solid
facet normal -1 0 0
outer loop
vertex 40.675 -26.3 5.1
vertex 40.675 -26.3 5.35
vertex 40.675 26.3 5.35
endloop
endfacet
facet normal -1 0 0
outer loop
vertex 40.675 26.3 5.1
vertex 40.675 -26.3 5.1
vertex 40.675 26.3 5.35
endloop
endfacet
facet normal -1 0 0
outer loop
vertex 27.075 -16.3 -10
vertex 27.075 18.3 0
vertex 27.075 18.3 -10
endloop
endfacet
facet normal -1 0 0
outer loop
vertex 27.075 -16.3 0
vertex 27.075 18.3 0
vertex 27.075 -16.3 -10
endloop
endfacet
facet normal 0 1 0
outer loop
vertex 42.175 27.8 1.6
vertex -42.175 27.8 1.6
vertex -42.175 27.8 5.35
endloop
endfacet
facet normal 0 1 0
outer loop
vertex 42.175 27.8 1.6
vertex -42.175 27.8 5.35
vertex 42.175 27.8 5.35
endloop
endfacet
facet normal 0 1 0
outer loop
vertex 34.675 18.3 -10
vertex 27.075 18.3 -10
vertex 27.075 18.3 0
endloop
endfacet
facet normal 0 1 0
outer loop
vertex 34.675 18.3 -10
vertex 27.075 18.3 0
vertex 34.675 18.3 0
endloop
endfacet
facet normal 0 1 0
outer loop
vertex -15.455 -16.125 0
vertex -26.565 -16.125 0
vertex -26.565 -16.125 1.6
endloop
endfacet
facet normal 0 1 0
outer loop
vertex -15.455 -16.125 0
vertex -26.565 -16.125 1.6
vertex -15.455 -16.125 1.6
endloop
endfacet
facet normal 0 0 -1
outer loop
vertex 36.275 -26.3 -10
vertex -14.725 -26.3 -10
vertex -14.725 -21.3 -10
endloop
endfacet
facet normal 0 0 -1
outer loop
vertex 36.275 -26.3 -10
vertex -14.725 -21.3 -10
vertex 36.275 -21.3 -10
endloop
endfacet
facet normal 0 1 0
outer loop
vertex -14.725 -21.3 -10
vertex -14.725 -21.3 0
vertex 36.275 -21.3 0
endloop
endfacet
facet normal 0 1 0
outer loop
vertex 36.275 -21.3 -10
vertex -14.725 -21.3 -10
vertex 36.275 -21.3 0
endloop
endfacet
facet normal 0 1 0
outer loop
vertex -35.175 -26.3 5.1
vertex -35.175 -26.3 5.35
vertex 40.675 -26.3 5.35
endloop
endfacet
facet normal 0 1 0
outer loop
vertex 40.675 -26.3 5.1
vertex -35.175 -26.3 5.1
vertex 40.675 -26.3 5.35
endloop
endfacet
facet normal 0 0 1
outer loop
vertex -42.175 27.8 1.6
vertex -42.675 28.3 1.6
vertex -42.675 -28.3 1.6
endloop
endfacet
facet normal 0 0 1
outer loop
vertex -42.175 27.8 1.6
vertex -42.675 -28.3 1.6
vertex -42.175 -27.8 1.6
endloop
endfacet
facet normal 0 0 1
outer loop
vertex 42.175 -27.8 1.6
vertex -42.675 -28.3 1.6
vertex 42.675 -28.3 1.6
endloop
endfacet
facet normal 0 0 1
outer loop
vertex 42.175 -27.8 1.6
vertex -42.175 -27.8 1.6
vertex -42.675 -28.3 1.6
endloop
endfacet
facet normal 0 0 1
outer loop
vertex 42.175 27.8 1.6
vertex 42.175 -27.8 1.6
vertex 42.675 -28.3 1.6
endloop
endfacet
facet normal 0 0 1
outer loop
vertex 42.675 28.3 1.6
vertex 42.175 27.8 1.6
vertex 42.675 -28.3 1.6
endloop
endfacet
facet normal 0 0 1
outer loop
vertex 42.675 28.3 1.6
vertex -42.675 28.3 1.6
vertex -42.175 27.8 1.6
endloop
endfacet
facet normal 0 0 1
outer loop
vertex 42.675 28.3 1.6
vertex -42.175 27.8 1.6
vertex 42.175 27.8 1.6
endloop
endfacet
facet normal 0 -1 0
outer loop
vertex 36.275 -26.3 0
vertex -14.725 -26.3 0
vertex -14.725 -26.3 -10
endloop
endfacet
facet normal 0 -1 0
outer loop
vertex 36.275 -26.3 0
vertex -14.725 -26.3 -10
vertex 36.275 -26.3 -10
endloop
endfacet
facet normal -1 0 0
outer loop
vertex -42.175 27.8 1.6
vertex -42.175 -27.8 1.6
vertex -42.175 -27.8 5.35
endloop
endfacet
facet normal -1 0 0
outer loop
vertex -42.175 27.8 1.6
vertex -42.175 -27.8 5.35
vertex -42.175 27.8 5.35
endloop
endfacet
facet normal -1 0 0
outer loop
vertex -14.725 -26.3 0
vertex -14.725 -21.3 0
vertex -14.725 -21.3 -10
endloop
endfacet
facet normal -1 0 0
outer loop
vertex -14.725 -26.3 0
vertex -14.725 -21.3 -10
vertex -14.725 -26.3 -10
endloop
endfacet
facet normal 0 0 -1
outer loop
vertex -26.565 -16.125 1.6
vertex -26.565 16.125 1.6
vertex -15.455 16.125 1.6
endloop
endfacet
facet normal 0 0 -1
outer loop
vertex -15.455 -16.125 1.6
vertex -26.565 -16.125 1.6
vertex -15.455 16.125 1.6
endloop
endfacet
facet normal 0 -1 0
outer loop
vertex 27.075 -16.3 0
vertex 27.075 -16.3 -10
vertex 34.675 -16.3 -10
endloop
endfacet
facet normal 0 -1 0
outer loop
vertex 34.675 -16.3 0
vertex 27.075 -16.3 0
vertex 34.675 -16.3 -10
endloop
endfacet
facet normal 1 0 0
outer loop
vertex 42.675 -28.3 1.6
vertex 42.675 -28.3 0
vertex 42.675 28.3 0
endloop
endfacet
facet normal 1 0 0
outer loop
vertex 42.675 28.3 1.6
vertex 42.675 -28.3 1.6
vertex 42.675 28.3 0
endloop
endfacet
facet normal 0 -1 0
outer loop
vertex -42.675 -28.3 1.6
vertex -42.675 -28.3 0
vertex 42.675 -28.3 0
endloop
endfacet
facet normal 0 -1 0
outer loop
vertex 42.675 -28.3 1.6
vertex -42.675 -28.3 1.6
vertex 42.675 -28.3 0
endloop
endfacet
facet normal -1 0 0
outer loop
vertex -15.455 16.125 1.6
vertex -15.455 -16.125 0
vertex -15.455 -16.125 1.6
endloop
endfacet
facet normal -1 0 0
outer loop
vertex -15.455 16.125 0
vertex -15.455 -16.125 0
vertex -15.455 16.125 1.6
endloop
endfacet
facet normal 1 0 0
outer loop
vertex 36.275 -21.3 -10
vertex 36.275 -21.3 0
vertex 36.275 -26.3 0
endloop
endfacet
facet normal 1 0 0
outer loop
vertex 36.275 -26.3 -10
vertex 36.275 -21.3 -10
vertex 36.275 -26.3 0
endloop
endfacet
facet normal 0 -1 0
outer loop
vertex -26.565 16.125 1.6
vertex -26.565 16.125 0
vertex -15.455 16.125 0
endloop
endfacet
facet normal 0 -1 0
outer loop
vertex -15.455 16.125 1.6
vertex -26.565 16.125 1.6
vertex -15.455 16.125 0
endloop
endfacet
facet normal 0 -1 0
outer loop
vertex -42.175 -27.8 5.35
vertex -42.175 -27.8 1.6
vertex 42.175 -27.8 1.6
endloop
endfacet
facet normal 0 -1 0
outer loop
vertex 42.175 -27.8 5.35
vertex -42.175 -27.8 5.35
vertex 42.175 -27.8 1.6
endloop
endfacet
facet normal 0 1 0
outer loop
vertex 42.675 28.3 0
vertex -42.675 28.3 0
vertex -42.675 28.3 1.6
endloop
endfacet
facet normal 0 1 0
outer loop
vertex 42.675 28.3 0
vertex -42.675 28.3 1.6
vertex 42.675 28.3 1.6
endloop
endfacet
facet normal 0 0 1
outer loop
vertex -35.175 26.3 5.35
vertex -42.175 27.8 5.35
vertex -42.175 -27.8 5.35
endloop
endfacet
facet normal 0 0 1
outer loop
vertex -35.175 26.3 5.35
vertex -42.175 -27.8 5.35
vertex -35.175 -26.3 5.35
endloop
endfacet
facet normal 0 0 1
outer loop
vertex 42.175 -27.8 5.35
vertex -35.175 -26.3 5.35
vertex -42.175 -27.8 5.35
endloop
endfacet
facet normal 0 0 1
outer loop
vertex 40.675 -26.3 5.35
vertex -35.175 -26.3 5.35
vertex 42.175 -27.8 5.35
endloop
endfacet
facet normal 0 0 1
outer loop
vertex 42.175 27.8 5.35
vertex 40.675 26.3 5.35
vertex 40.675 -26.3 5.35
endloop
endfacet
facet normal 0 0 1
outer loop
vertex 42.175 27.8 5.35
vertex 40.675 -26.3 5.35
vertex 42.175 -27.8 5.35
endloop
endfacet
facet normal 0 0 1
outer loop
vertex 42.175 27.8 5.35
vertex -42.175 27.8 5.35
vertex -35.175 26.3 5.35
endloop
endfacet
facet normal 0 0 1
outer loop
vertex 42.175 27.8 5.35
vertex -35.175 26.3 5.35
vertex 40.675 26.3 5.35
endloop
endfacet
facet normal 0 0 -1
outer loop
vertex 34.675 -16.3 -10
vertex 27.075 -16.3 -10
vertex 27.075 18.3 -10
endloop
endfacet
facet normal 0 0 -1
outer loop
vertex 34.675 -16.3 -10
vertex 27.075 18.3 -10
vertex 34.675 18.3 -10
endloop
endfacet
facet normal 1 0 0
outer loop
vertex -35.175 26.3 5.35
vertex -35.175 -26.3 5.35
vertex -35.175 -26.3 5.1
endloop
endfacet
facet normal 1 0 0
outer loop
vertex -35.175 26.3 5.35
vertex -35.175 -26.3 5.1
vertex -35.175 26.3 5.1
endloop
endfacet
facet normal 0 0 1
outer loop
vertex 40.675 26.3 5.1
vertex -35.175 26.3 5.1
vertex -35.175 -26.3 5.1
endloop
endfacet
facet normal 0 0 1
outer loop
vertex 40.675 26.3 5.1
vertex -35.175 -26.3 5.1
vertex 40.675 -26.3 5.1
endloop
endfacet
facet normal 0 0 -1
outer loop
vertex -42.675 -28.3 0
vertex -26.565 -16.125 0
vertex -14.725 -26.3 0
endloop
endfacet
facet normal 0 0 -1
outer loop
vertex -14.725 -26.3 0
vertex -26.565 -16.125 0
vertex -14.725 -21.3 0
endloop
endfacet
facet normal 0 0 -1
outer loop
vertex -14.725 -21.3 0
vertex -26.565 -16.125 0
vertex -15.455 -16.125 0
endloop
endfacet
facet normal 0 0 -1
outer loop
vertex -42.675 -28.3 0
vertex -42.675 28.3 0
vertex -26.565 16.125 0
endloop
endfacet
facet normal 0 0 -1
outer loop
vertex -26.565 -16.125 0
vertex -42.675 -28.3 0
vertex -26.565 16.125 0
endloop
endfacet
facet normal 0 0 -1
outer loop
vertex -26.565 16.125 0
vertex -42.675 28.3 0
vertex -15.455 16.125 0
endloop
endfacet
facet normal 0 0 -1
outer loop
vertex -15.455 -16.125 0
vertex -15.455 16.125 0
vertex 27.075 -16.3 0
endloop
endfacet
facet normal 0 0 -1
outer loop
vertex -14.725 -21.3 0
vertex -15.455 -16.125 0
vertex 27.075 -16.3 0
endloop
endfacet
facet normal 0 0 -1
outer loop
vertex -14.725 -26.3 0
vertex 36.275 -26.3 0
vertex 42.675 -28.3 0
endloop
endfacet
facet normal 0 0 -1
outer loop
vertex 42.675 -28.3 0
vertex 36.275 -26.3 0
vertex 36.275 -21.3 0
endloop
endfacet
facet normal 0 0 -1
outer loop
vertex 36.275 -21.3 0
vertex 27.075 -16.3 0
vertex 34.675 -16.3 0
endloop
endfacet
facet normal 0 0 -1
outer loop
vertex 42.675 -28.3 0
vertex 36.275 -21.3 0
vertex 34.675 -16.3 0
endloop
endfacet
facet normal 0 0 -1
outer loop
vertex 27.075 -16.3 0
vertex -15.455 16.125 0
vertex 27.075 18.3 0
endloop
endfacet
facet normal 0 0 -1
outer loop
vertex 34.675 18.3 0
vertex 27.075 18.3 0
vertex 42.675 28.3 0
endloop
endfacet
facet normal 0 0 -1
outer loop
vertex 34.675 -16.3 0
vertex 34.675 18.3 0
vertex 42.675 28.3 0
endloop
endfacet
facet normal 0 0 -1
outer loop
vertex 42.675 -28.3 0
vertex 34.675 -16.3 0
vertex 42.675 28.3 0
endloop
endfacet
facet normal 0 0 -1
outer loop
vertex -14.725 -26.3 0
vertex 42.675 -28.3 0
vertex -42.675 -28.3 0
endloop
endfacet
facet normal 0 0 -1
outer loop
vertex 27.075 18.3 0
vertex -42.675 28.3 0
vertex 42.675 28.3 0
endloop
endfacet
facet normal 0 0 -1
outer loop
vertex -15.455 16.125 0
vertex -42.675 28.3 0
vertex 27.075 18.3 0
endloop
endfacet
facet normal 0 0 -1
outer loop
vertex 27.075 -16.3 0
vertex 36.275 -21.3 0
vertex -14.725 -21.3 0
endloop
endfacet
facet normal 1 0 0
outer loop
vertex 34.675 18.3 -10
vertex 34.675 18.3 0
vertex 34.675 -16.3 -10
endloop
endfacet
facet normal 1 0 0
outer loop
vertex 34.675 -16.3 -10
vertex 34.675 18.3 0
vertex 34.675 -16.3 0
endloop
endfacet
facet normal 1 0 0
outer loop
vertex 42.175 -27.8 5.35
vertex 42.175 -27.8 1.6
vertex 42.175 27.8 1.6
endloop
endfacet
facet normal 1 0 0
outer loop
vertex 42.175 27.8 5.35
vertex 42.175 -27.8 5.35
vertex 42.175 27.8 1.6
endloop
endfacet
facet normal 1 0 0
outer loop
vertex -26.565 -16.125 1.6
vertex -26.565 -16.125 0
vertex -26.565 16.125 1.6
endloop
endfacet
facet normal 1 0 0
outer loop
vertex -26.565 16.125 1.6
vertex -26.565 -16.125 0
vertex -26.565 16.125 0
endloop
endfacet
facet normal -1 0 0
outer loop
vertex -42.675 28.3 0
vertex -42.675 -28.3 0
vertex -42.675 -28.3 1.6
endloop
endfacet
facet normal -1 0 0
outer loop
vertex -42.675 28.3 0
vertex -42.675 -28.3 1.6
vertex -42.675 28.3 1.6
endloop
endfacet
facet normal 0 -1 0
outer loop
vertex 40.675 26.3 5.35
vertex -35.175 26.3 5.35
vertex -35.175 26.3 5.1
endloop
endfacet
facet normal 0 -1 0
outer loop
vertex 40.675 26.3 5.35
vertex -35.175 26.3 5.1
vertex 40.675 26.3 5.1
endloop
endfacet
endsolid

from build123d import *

# Parameters (mm, degrees)
F0_W     = 85.35
F0_H     = 56.6
F0_W_2   = 11.11
F0_H_2   = 32.25
F1_DEPTH = 1.6
F2_W     = 84.35
F2_H     = 55.6
F3_DEPTH = 3.75
F4_W     = 75.85
F4_H     = 52.6
F5_DEPTH = 0.25
F6_W     = 7.6
F6_H     = 34.6
F6_W_2   = 51
F6_H_2   = 5
F7_DEPTH = 10


with BuildPart() as f1:
    # F0 (on Top) → F1 (new body)
    with BuildSketch(Plane.XY):
        Rectangle(F0_W, F0_H)
        with Locations((-21.01, 0)):
            Rectangle(F0_W_2, F0_H_2, mode=Mode.SUBTRACT)
    extrude(amount=F1_DEPTH)

    # F2 (on face) → F3 (join)
    with BuildSketch(Plane.XY.offset(1.6)):
        Rectangle(F2_W, F2_H)
    extrude(amount=F3_DEPTH)

    # F4 (on face) → F5 (cut)
    with BuildSketch(Plane.XY.offset(5.35)):
        with Locations((2.75, 0)):
            Rectangle(F4_W, F4_H)
    extrude(amount=-F5_DEPTH, mode=Mode.SUBTRACT)

    # F6 (on face) → F7 (join)
    with BuildSketch(Plane(origin=(0, 0, 0), x_dir=(1, 0, 0), z_dir=(0, 0, -1))):
        with Locations((30.875, -1)):
            Rectangle(F6_W, F6_H)
        with Locations((10.775, 23.8)):
            Rectangle(F6_W_2, F6_H_2)
    extrude(amount=F7_DEPTH)


solid = f1.part
